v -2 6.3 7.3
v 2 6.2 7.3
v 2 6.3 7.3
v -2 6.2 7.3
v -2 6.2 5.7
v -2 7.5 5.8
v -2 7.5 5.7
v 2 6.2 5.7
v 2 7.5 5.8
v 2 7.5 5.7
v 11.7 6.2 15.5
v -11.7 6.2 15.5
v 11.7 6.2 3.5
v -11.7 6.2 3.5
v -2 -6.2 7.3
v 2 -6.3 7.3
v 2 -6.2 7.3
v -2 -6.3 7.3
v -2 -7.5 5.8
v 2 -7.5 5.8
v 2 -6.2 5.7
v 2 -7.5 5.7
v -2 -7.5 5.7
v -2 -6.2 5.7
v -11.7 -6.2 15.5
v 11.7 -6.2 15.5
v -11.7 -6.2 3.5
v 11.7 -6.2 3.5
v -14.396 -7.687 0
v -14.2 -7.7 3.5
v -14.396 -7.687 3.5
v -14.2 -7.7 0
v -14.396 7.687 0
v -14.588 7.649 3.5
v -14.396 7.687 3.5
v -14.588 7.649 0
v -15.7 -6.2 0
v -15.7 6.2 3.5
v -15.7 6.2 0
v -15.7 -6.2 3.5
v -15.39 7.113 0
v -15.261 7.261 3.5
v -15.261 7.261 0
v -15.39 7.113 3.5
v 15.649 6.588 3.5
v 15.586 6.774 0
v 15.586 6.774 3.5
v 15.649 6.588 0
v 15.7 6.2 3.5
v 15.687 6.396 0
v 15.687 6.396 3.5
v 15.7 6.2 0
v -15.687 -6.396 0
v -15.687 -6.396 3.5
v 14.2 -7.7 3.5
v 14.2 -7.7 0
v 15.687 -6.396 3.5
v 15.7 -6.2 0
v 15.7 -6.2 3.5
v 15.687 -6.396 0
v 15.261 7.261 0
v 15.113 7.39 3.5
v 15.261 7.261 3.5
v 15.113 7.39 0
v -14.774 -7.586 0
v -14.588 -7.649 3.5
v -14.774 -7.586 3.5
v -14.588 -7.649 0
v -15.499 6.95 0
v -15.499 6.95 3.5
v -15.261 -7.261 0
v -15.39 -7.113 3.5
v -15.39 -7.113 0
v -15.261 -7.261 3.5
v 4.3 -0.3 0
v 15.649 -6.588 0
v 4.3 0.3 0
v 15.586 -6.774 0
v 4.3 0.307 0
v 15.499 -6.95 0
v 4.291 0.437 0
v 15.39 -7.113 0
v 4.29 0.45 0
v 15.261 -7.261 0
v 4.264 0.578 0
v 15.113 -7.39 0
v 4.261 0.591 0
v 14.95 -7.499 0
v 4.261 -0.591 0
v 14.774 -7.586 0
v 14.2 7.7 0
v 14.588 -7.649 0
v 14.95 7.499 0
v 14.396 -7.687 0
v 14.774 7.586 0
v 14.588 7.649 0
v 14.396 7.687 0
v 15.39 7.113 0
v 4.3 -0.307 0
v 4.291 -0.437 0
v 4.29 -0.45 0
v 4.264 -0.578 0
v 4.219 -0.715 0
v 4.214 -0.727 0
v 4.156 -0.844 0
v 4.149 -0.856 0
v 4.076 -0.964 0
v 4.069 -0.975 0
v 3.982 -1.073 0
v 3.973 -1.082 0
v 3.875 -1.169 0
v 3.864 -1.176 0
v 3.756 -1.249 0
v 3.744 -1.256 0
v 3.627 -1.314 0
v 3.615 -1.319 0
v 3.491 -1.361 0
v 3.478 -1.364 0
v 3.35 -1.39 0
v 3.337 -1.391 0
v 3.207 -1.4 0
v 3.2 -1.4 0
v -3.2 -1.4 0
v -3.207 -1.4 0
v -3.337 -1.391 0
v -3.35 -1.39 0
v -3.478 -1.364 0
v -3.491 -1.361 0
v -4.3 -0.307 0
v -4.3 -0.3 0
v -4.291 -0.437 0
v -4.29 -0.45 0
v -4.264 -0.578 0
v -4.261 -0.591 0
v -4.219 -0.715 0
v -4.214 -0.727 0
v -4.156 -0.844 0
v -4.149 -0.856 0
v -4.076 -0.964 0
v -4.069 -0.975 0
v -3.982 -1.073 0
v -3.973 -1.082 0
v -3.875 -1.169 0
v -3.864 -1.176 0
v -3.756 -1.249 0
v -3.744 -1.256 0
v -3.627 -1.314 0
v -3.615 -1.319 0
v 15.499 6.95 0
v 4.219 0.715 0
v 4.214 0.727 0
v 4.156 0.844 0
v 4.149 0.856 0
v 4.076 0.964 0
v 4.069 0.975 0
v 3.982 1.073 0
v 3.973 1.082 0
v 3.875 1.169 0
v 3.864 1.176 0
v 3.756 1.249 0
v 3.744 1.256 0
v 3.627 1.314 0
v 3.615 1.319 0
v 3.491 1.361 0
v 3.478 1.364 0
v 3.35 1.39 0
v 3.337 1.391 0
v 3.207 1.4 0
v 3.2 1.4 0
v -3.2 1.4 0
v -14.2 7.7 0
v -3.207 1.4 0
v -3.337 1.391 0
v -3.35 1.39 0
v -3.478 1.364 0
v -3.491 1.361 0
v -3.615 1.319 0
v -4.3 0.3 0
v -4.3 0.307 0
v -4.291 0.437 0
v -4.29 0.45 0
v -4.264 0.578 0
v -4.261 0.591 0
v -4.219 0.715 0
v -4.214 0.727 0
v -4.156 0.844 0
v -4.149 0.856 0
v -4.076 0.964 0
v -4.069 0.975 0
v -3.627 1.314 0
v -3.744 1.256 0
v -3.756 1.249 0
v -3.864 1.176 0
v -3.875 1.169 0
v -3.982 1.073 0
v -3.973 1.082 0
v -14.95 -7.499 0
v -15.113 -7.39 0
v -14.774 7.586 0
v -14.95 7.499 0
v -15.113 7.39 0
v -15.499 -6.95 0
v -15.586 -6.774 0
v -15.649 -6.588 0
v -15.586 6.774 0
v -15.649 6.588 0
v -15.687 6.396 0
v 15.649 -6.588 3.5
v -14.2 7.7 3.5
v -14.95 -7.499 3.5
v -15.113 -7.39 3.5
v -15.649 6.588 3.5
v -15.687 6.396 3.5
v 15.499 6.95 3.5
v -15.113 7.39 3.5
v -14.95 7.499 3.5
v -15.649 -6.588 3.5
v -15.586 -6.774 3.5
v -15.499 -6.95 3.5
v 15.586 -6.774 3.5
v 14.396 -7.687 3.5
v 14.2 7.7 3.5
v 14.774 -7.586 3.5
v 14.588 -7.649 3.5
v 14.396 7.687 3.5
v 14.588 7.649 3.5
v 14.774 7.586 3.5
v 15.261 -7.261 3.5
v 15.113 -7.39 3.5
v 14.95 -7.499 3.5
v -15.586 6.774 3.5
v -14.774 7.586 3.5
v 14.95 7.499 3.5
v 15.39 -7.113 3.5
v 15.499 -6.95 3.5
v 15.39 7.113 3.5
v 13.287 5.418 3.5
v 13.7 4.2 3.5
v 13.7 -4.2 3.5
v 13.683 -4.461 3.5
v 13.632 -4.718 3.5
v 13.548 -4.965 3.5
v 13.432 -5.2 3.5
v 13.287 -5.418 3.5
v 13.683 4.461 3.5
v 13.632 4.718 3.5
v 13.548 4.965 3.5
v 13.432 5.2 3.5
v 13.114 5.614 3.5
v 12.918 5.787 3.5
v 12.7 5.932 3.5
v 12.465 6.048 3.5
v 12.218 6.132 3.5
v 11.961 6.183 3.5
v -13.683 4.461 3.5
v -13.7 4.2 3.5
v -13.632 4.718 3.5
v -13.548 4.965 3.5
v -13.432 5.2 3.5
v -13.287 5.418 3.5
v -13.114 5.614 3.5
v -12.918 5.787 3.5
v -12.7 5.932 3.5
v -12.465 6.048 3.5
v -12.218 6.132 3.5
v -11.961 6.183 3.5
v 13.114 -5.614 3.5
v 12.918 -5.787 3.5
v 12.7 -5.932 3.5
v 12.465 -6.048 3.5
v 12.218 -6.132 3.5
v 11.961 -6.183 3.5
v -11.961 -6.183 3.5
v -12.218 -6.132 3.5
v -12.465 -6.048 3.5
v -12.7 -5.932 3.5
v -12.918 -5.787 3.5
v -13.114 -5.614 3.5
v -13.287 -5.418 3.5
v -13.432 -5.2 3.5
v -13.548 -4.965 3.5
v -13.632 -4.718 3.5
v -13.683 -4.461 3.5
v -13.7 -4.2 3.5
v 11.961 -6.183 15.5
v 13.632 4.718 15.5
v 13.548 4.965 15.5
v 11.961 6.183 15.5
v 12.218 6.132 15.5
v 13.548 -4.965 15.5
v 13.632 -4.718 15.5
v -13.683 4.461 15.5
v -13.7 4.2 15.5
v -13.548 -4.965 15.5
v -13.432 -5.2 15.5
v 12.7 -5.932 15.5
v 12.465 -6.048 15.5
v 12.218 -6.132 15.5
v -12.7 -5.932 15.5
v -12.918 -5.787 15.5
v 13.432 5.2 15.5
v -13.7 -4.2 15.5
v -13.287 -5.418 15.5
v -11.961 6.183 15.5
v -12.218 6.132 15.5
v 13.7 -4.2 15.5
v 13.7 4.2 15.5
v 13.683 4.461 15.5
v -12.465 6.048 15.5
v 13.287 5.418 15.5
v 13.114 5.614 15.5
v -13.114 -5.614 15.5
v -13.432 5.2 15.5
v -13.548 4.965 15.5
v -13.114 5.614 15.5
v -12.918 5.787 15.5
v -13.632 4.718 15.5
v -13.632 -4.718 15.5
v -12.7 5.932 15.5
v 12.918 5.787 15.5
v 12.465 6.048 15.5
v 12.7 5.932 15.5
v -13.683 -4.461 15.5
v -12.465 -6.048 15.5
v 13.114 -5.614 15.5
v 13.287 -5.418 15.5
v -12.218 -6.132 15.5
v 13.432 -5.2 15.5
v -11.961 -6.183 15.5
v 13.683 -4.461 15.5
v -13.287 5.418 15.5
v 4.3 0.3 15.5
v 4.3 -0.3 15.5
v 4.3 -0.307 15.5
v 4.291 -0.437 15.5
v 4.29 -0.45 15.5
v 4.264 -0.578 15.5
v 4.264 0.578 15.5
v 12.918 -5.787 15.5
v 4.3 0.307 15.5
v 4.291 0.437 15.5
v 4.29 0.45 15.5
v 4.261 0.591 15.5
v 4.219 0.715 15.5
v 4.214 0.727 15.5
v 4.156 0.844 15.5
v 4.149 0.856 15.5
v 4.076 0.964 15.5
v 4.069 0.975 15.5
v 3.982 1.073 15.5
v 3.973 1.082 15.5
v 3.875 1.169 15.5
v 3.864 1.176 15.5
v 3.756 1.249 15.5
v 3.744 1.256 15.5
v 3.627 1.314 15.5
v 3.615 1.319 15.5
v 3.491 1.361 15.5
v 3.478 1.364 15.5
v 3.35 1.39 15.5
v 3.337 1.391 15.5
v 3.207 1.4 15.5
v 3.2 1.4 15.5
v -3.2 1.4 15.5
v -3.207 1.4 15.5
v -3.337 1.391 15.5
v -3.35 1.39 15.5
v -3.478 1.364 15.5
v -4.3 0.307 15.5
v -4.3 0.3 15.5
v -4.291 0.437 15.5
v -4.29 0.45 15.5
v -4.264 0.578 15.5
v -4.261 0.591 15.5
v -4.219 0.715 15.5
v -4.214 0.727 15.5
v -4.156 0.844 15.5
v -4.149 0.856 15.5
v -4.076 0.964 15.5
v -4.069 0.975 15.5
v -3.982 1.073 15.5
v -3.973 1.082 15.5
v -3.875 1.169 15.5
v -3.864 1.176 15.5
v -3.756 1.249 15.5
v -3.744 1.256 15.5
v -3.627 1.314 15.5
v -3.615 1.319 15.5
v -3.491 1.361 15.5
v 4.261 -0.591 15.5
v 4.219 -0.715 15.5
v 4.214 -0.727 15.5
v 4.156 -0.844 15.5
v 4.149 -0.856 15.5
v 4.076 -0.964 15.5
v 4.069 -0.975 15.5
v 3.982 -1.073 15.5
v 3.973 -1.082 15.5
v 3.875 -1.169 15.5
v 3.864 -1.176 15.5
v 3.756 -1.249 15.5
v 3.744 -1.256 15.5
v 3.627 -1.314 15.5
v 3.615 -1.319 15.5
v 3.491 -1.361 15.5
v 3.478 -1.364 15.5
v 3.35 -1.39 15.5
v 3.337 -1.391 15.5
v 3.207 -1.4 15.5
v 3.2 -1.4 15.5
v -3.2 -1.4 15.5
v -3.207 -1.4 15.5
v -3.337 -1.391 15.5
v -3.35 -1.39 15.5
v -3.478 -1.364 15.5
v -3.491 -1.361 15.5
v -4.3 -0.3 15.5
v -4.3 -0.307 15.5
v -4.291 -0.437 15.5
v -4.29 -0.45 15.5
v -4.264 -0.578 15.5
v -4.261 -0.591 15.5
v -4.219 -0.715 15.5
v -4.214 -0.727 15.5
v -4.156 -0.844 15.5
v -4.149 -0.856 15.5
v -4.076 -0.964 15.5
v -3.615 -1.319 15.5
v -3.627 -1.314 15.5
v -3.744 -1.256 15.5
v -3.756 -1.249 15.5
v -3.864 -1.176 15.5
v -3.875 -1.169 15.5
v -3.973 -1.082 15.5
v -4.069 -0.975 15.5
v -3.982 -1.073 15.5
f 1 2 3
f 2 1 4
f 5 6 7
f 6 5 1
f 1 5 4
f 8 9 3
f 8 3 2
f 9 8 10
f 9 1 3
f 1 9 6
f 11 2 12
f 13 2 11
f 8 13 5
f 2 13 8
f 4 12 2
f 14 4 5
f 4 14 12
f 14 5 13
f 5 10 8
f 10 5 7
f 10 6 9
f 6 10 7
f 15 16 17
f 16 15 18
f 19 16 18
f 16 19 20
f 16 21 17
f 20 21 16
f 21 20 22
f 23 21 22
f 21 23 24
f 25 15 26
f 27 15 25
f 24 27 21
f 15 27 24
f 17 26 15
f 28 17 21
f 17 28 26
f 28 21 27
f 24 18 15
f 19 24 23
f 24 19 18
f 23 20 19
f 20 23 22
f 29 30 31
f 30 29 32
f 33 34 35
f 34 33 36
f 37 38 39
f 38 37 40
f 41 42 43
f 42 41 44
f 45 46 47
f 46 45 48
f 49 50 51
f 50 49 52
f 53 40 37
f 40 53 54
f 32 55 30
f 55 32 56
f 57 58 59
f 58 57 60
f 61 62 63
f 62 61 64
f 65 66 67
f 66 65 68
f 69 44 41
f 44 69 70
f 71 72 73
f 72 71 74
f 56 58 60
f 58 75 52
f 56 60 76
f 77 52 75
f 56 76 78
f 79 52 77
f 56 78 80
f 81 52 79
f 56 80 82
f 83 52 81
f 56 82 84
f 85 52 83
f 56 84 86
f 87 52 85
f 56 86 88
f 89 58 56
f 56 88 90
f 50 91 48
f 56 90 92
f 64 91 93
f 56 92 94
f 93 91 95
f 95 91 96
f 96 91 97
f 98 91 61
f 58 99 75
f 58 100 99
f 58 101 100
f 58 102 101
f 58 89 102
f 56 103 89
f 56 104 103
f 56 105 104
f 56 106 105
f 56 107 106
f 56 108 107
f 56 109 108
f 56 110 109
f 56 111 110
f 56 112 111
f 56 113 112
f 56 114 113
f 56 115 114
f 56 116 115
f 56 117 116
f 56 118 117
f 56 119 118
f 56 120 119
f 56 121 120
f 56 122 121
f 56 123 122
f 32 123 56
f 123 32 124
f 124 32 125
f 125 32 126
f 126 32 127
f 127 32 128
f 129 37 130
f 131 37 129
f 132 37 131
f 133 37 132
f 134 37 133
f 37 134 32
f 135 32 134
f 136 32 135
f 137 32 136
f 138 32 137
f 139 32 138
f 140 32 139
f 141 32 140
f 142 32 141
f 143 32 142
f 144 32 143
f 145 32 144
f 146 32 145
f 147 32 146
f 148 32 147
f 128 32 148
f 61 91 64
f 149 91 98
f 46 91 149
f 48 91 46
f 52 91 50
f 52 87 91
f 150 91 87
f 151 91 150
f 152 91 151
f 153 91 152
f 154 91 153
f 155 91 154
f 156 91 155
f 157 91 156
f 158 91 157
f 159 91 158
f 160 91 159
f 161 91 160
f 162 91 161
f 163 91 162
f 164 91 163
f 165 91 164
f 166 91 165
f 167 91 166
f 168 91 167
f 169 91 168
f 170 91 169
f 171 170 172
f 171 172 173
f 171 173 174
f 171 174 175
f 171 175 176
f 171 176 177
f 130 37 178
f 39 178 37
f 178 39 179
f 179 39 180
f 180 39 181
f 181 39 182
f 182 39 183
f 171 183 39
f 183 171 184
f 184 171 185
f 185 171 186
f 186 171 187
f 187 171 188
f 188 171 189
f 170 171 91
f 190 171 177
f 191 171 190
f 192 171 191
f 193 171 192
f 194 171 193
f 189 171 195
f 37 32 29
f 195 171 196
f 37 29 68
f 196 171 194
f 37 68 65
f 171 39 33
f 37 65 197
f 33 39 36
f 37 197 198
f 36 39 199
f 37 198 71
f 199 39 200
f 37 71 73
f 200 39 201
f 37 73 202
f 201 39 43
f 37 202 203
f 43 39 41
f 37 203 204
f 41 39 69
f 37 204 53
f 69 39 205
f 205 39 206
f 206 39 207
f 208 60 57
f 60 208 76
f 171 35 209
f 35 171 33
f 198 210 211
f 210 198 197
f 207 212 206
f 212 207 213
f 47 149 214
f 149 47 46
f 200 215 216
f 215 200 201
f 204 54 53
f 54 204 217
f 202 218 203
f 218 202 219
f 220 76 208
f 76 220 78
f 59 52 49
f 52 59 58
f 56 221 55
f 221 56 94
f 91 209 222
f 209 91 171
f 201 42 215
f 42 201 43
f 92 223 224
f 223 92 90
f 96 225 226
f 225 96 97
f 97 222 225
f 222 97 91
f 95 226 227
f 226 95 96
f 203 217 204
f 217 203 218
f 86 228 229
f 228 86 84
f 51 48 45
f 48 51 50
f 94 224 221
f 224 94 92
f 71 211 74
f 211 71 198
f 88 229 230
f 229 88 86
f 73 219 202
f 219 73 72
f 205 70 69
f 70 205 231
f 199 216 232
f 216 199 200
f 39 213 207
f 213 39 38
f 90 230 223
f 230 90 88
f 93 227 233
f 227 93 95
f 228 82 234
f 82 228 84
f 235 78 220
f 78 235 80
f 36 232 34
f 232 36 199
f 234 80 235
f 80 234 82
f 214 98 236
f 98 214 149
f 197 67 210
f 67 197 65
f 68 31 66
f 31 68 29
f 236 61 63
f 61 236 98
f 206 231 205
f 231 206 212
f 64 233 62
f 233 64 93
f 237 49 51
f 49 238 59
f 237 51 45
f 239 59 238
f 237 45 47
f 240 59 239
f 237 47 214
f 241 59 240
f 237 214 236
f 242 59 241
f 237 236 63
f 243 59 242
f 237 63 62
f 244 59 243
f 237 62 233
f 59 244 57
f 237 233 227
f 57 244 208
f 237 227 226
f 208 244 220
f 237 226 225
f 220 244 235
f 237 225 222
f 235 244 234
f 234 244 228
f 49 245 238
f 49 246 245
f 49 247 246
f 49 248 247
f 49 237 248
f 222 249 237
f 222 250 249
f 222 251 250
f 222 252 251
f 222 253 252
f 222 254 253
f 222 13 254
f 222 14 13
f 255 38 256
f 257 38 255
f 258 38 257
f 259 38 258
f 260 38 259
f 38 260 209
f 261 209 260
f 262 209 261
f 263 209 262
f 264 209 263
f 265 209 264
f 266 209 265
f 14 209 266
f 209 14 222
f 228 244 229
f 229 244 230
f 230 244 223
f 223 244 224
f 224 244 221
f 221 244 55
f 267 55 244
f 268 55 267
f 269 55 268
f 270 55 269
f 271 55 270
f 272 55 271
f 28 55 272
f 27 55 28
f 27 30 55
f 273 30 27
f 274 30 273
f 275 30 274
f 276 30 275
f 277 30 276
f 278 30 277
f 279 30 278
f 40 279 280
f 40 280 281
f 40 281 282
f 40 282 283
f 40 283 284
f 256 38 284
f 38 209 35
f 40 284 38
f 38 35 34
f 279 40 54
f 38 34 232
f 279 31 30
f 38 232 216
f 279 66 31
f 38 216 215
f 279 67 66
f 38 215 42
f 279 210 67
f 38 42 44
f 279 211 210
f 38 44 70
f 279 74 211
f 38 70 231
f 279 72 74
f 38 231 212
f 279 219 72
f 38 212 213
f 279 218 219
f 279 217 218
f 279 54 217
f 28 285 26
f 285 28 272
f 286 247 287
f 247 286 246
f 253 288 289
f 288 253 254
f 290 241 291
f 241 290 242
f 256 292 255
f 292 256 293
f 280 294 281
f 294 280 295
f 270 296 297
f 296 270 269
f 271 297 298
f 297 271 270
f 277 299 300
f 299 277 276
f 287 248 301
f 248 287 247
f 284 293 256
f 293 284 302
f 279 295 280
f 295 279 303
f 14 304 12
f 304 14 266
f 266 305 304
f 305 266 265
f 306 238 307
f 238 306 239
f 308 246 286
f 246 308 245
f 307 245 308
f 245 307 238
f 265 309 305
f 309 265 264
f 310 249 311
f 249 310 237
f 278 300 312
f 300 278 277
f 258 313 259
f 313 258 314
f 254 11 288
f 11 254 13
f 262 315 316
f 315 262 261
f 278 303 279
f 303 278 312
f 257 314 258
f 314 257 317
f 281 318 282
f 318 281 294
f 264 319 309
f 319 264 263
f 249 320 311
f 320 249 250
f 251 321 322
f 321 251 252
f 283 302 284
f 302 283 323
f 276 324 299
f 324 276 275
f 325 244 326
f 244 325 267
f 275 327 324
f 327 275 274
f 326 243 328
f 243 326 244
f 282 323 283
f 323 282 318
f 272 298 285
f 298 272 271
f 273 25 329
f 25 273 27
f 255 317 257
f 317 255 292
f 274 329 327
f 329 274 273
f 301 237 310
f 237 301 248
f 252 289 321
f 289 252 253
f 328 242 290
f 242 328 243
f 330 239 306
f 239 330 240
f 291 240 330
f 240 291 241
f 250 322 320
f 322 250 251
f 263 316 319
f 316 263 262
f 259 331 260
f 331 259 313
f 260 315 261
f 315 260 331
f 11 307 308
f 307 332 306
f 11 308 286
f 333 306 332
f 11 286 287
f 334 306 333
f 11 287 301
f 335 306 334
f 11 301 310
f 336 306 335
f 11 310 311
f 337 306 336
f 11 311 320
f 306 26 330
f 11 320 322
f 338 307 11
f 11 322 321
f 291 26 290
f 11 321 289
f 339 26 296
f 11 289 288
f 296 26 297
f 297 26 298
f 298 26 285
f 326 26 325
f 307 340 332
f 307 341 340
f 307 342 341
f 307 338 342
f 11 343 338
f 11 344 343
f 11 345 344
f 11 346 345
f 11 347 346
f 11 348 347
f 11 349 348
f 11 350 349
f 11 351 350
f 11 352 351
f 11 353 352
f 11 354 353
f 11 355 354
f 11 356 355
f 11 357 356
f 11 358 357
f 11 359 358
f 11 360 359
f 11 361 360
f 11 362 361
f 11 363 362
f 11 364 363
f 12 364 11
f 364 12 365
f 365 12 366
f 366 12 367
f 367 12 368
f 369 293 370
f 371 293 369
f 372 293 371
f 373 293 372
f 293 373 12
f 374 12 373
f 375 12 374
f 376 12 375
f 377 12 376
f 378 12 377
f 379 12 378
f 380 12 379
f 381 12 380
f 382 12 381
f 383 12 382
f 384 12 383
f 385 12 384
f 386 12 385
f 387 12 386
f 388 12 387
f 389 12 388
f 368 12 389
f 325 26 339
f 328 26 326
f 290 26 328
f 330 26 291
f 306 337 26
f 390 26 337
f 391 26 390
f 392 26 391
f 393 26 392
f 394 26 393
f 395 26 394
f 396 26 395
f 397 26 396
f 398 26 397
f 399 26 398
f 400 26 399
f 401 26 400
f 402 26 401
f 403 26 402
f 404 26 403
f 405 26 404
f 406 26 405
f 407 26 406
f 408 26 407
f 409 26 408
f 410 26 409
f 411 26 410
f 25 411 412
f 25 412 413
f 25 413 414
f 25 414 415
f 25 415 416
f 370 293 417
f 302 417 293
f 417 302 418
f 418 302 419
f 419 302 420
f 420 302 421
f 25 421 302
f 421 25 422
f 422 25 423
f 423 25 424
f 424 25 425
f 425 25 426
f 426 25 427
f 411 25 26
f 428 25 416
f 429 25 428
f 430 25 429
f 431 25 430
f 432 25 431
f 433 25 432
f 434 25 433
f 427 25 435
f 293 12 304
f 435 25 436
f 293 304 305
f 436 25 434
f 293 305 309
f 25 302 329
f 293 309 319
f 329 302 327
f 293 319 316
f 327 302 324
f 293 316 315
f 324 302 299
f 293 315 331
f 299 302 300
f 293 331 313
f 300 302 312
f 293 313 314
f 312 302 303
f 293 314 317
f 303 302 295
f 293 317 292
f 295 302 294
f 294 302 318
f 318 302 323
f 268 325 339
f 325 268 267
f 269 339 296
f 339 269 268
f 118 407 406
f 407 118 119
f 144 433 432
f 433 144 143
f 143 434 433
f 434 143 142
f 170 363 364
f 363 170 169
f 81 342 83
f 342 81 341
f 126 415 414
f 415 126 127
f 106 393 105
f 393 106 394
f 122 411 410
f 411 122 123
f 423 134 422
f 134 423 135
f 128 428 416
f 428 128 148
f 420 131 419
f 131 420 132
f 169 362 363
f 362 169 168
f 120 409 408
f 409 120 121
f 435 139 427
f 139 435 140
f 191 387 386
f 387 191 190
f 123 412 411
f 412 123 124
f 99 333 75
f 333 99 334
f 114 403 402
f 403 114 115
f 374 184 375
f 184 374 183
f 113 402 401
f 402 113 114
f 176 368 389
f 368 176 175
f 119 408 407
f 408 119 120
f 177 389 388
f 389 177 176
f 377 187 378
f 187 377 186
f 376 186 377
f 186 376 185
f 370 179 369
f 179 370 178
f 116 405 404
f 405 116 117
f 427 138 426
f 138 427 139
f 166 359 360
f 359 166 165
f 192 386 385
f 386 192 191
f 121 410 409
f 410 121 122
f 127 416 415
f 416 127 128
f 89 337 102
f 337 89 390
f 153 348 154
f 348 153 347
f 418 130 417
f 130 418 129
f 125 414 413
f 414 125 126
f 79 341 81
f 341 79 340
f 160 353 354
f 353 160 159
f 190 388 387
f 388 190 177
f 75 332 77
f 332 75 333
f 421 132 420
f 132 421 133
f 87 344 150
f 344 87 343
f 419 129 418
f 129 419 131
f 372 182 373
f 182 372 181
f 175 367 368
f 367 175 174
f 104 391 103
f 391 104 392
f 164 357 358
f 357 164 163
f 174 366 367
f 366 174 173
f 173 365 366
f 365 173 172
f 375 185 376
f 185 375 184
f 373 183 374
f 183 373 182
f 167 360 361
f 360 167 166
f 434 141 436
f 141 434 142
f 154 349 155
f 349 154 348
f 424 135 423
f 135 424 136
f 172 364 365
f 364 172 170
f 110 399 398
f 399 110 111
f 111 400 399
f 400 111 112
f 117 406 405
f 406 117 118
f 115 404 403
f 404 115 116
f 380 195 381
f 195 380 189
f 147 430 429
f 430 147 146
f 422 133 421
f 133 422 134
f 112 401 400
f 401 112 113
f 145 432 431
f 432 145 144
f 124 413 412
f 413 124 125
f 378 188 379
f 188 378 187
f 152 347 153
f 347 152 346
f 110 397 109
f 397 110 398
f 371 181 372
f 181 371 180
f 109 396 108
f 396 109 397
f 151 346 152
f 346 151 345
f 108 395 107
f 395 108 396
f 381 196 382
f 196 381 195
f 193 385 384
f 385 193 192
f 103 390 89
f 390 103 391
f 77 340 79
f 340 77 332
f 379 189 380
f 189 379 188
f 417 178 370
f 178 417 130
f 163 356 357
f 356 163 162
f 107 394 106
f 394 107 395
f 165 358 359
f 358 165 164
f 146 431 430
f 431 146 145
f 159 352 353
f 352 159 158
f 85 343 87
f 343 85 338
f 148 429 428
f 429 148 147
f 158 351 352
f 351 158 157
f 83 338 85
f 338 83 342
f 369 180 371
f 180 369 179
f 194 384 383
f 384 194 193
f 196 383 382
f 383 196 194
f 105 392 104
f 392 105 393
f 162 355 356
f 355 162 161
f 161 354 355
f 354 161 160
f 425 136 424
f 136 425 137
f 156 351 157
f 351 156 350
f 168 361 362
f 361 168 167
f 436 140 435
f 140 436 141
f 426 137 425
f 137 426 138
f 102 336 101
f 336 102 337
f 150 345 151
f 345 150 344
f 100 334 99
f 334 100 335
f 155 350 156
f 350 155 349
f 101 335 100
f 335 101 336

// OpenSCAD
// file: parameters.scad
// ============================================
// MODULAR CABLE ORGANIZER - SHARED PARAMETERS
// ============================================
// All dimensions in mm - include this in all files
// ============================================

$fn = 48;

// === TOLERANCES ===
clearance = 0.3;
port_clearance = 0.1;  // Extra clearance for port openings (reduced - 0.2 was too loose for USB-C)
wall = 1.6;

// === SLOT DIMENSIONS (2:1 aspect ratio) - scaled to 2/3 ===
slot_width = 32;  // Reduced by 1mm for more compact insert
slot_height = 16;  // Reduced by 1mm for more compact insert
slot_depth = 4;  // Reduced from 6mm - less frame depth needed

// === FRAME STRUCTURE ===
frame_wall = 0.5;   // Reduced for more compact frame
frame_border = 8;  // Increased by 10mm for mounting holes with countersink
frame_back = 2;     // Slightly thicker for snap catch strength
mount_hole_dia = 3;
countersink_dia = 6;  // Diameter of countersink for screw heads
countersink_depth = 2;  // Depth of countersink

// === GRID ===
grid_cols = 2;
grid_rows = 2;

// === INSERT BASE DIMENSIONS ===
insert_width = slot_width - (2 * clearance);
insert_height = slot_height - (2 * clearance);
insert_base_depth = slot_depth - 0.5;

// === INSERT BODY (protrudes from frame) ===
insert_body_width = insert_width - 4;
insert_body_height = insert_height - 3;
insert_body_depth = 12;  // Deep enough to accommodate male cable connectors
insert_top_thick = 1.5;  // Top platform thickness

// === SNAP TABS (on neck/body - catch on back plate) ===
snap_tab_width = 4;
snap_tab_protrude = 1.2;  // How far tab sticks out from body
snap_tab_thick = 1.5;     // Z thickness of tab
snap_tab_offset = 2.2;      // Distance from base to tab bottom on insert (increased to clear frame)

// === CONNECTOR PORT DIMENSIONS & BODY DEPTHS ===
// Port dimensions from reference blueprints
// Body depths sized to match typical male connector lengths

// USB-C: 8.4 x 2.6mm, male connector ~9mm
usbc_w = 8.4;
usbc_h = 2.6;
usbc_r = 1.0;
usbc_body_depth = 9;

// USB-A: 14.0 x 6.5mm, male connector ~13mm
usba_w = 14.0;
usba_h = 6.5;
usba_r = 0.5;
usba_body_depth = 13;

// USB Mini: 6.9 x 3.0mm, male connector ~9mm
usb_mini_w = 6.9;
usb_mini_h = 3.0;
usb_mini_r = 0.5;
usb_mini_body_depth = 9;

// USB Micro: 6.9 x 1.8mm, male connector ~7mm
usb_micro_w = 6.9;
usb_micro_h = 1.8;
usb_micro_r = 0.3;
usb_micro_body_depth = 7;

// USB-B: 8.0 x 7.5mm, male connector ~14mm
usb_b_w = 8.0;
usb_b_h = 7.5;
usb_b_r = 1.0;
usb_b_body_depth = 14;

// Lightning: 6.7 x 1.5mm, male connector ~8mm
lightning_w = 6.7;
lightning_h = 1.5;
lightning_r = 0.5;
lightning_body_depth = 8;

// HDMI: 14.0 x 4.5mm, male connector ~16mm
hdmi_w = 14.0;
hdmi_h = 4.5;
hdmi_r = 0.5;
hdmi_body_depth = 16;

// 3.5mm Audio Jack: male plug ~14mm
audio_jack_dia = 6.0;
audio_jack_body_depth = 14;

// Blank/Label: recessed area for label
label_w = 30;
label_h = 12;
label_depth = 0.8;

// === CALCULATED VALUES ===
frame_total_depth = frame_back + slot_depth;
grid_width = (grid_cols * slot_width) + ((grid_cols - 1) * frame_wall);
grid_height = (grid_rows * slot_height) + ((grid_rows - 1) * frame_wall);
frame_width = grid_width + (2 * frame_border);
frame_height_total = grid_height + (2 * frame_border);
insert_total_depth = insert_base_depth + insert_body_depth;
// file: insert_base.scad
// ============================================
// MODULAR CABLE ORGANIZER - BASE INSERT MODULE
// ============================================
// This is the parent module for all insert types
// Include this file and call insert_with_port() with a port shape
// ============================================

include <parameters.scad>

// === BASE INSERT WITH CUSTOM BODY DEPTH ===
module insert_blank_custom(body_depth) {
    union() {
        // Base plate (sits in frame slot)
        rounded_box_rect(insert_width, insert_height, insert_base_depth, 1.5);
        
        // Body (protrudes out front) - custom depth
        translate([0, 0, insert_base_depth])
            rounded_box_rect(insert_body_width, insert_body_height, body_depth, 2);
        
        // Snap tabs on all 4 sides
        snap_tabs_all();
    }
}

// === BASE INSERT (default depth - for backwards compatibility) ===
module insert_blank() {
    insert_blank_custom(insert_body_depth);
}

// === INSERT WITH THROUGH-HOLE PORT (custom depth) ===
// Pass body_depth and a 2D shape as children
module insert_with_port_custom(body_depth) {
    total_depth = insert_base_depth + body_depth;
    difference() {
        insert_blank_custom(body_depth);
        
        // Cut port hole ALL THE WAY through (tube shape)
        translate([0, 0, -0.1])
            linear_extrude(total_depth + 0.2)
            offset(r=port_clearance)  // Add clearance to port opening
            children();
    }
}

// === INSERT WITH THROUGH-HOLE PORT (default depth) ===
module insert_with_port() {
    insert_with_port_custom(insert_body_depth) children();
}

// === PRE-MADE INSERT MODULES WITH CORRECT DEPTHS ===
module insert_usbc() {
    insert_with_port_custom(usbc_body_depth) port_usbc();
}

module insert_usba() {
    insert_with_port_custom(usba_body_depth) port_usba();
}

module insert_usb_mini() {
    insert_with_port_custom(usb_mini_body_depth) port_usb_mini();
}

module insert_usb_micro() {
    insert_with_port_custom(usb_micro_body_depth) port_usb_micro();
}

module insert_usb_b() {
    insert_with_port_custom(usb_b_body_depth) port_usb_b();
}

module insert_lightning() {
    insert_with_port_custom(lightning_body_depth) port_lightning();
}

module insert_hdmi() {
    insert_with_port_custom(hdmi_body_depth) port_hdmi();
}

module insert_audio_jack() {
    insert_with_port_custom(audio_jack_body_depth) port_audio_jack();
}

// === SNAP TABS (on neck/body - catch on frame cutouts) ===
// Tabs are on the body, positioned to engage with frame wall cutouts
module snap_tabs_all() {
    // Position tabs up on body (clear of base/frame)
    tab_z = insert_base_depth + snap_tab_offset;
    
    // Tabs on all 4 sides of the body
    for (angle = [0, 90, 180, 270]) {
        rotate([0, 0, angle])
            translate([0, insert_body_height/2, tab_z])
            neck_snap_tab();
    }
}

module neck_snap_tab() {
    // Wedge shape (FLIPPED): 
    // - Peak/taper on BOTTOM - slides past back plate when inserting
    // - Flat on TOP - catches and holds
    hull() {
        // Peak of wedge (protruding, at BOTTOM of tab)
        translate([-snap_tab_width/2, snap_tab_protrude, 0])
            cube([snap_tab_width, 0.1, 0.1]);
        // Flat top (at body surface, TOP of tab)
        translate([-snap_tab_width/2, 0, snap_tab_thick])
            cube([snap_tab_width, 0.1, 0.1]);
        // Base of wedge (at body surface, bottom)
        translate([-snap_tab_width/2, 0, 0])
            cube([snap_tab_width, 0.1, 0.1]);
    }
}

module snap_tab_horizontal() {
    hull() {
        translate([0, -snap_tab_protrude/2, 0])
            cube([snap_tab_width, 0.1, snap_tab_thick], center=true);
        translate([0, snap_tab_protrude/2, snap_tab_thick * 0.2])
            cube([snap_tab_width, 0.1, snap_tab_thick * 0.6], center=true);
    }
}

module snap_tab_vertical() {
    hull() {
        translate([-snap_tab_protrude/2, 0, 0])
            cube([0.1, snap_tab_width, snap_tab_thick], center=true);
        translate([snap_tab_protrude/2, 0, snap_tab_thick * 0.2])
            cube([0.1, snap_tab_width, snap_tab_thick * 0.6], center=true);
    }
}

// === UTILITY MODULES ===
module rounded_box_rect(w, d, h, r) {
    translate([0, 0, h/2])
        hull() {
            for (x = [-1, 1], y = [-1, 1])
                translate([x * (w/2 - r), y * (d/2 - r), 0])
                    cylinder(h=h, r=r, center=true);
        }
}

// === PORT SHAPE MODULES (2D) ===
// These define the cutout shapes for each connector type

module port_rounded_rect(w, h, r) {
    // Standard rounded rectangle
    hull() {
        for (x = [-1, 1], y = [-1, 1])
            translate([x * (w/2 - r), y * (h/2 - r)])
                circle(r=r);
    }
}

module port_usbc() {
    port_rounded_rect(usbc_w, usbc_h, usbc_r);
}

module port_usba() {
    port_rounded_rect(usba_w, usba_h, usba_r);
}

module port_usb_mini() {
    port_rounded_rect(usb_mini_w, usb_mini_h, usb_mini_r);
}

module port_usb_micro() {
    port_rounded_rect(usb_micro_w, usb_micro_h, usb_micro_r);
}

module port_usb_b() {
    // USB-B has beveled top corners
    hull() {
        // Bottom corners (full radius)
        for (x = [-1, 1])
            translate([x * (usb_b_w/2 - usb_b_r), -(usb_b_h/2 - usb_b_r)])
                circle(r=usb_b_r);
        // Top corners (chamfered - moved inward)
        for (x = [-1, 1])
            translate([x * (usb_b_w/2 - usb_b_r - 1), (usb_b_h/2 - usb_b_r)])
                circle(r=usb_b_r);
    }
}

module port_lightning() {
    port_rounded_rect(lightning_w, lightning_h, lightning_r);
}

module port_hdmi() {
    // HDMI is tapered (wider at top)
    hull() {
        // Top (wider)
        for (x = [-1, 1])
            translate([x * (hdmi_w/2 - hdmi_r), (hdmi_h/2 - hdmi_r)])
                circle(r=hdmi_r);
        // Bottom (narrower)
        for (x = [-1, 1])
            translate([x * (hdmi_w/2 - hdmi_r - 1), -(hdmi_h/2 - hdmi_r)])
                circle(r=hdmi_r);
    }
}

module port_audio_jack() {
    circle(d=audio_jack_dia);
}

module port_label_recess() {
    // Shallow rectangular recess for labels
    square([label_w, label_h], center=true);
}

// === RENDER (for testing this file directly) ===
// insert_blank();
// main file
// ============================================
// USB-C FEMALE INSERT
// Port: 8.4mm x 2.6mm rounded rectangle
// ============================================

include <insert_base.scad>

module insert_usbc() {
    insert_with_port() port_usbc();
}

// Render
insert_usbc();
